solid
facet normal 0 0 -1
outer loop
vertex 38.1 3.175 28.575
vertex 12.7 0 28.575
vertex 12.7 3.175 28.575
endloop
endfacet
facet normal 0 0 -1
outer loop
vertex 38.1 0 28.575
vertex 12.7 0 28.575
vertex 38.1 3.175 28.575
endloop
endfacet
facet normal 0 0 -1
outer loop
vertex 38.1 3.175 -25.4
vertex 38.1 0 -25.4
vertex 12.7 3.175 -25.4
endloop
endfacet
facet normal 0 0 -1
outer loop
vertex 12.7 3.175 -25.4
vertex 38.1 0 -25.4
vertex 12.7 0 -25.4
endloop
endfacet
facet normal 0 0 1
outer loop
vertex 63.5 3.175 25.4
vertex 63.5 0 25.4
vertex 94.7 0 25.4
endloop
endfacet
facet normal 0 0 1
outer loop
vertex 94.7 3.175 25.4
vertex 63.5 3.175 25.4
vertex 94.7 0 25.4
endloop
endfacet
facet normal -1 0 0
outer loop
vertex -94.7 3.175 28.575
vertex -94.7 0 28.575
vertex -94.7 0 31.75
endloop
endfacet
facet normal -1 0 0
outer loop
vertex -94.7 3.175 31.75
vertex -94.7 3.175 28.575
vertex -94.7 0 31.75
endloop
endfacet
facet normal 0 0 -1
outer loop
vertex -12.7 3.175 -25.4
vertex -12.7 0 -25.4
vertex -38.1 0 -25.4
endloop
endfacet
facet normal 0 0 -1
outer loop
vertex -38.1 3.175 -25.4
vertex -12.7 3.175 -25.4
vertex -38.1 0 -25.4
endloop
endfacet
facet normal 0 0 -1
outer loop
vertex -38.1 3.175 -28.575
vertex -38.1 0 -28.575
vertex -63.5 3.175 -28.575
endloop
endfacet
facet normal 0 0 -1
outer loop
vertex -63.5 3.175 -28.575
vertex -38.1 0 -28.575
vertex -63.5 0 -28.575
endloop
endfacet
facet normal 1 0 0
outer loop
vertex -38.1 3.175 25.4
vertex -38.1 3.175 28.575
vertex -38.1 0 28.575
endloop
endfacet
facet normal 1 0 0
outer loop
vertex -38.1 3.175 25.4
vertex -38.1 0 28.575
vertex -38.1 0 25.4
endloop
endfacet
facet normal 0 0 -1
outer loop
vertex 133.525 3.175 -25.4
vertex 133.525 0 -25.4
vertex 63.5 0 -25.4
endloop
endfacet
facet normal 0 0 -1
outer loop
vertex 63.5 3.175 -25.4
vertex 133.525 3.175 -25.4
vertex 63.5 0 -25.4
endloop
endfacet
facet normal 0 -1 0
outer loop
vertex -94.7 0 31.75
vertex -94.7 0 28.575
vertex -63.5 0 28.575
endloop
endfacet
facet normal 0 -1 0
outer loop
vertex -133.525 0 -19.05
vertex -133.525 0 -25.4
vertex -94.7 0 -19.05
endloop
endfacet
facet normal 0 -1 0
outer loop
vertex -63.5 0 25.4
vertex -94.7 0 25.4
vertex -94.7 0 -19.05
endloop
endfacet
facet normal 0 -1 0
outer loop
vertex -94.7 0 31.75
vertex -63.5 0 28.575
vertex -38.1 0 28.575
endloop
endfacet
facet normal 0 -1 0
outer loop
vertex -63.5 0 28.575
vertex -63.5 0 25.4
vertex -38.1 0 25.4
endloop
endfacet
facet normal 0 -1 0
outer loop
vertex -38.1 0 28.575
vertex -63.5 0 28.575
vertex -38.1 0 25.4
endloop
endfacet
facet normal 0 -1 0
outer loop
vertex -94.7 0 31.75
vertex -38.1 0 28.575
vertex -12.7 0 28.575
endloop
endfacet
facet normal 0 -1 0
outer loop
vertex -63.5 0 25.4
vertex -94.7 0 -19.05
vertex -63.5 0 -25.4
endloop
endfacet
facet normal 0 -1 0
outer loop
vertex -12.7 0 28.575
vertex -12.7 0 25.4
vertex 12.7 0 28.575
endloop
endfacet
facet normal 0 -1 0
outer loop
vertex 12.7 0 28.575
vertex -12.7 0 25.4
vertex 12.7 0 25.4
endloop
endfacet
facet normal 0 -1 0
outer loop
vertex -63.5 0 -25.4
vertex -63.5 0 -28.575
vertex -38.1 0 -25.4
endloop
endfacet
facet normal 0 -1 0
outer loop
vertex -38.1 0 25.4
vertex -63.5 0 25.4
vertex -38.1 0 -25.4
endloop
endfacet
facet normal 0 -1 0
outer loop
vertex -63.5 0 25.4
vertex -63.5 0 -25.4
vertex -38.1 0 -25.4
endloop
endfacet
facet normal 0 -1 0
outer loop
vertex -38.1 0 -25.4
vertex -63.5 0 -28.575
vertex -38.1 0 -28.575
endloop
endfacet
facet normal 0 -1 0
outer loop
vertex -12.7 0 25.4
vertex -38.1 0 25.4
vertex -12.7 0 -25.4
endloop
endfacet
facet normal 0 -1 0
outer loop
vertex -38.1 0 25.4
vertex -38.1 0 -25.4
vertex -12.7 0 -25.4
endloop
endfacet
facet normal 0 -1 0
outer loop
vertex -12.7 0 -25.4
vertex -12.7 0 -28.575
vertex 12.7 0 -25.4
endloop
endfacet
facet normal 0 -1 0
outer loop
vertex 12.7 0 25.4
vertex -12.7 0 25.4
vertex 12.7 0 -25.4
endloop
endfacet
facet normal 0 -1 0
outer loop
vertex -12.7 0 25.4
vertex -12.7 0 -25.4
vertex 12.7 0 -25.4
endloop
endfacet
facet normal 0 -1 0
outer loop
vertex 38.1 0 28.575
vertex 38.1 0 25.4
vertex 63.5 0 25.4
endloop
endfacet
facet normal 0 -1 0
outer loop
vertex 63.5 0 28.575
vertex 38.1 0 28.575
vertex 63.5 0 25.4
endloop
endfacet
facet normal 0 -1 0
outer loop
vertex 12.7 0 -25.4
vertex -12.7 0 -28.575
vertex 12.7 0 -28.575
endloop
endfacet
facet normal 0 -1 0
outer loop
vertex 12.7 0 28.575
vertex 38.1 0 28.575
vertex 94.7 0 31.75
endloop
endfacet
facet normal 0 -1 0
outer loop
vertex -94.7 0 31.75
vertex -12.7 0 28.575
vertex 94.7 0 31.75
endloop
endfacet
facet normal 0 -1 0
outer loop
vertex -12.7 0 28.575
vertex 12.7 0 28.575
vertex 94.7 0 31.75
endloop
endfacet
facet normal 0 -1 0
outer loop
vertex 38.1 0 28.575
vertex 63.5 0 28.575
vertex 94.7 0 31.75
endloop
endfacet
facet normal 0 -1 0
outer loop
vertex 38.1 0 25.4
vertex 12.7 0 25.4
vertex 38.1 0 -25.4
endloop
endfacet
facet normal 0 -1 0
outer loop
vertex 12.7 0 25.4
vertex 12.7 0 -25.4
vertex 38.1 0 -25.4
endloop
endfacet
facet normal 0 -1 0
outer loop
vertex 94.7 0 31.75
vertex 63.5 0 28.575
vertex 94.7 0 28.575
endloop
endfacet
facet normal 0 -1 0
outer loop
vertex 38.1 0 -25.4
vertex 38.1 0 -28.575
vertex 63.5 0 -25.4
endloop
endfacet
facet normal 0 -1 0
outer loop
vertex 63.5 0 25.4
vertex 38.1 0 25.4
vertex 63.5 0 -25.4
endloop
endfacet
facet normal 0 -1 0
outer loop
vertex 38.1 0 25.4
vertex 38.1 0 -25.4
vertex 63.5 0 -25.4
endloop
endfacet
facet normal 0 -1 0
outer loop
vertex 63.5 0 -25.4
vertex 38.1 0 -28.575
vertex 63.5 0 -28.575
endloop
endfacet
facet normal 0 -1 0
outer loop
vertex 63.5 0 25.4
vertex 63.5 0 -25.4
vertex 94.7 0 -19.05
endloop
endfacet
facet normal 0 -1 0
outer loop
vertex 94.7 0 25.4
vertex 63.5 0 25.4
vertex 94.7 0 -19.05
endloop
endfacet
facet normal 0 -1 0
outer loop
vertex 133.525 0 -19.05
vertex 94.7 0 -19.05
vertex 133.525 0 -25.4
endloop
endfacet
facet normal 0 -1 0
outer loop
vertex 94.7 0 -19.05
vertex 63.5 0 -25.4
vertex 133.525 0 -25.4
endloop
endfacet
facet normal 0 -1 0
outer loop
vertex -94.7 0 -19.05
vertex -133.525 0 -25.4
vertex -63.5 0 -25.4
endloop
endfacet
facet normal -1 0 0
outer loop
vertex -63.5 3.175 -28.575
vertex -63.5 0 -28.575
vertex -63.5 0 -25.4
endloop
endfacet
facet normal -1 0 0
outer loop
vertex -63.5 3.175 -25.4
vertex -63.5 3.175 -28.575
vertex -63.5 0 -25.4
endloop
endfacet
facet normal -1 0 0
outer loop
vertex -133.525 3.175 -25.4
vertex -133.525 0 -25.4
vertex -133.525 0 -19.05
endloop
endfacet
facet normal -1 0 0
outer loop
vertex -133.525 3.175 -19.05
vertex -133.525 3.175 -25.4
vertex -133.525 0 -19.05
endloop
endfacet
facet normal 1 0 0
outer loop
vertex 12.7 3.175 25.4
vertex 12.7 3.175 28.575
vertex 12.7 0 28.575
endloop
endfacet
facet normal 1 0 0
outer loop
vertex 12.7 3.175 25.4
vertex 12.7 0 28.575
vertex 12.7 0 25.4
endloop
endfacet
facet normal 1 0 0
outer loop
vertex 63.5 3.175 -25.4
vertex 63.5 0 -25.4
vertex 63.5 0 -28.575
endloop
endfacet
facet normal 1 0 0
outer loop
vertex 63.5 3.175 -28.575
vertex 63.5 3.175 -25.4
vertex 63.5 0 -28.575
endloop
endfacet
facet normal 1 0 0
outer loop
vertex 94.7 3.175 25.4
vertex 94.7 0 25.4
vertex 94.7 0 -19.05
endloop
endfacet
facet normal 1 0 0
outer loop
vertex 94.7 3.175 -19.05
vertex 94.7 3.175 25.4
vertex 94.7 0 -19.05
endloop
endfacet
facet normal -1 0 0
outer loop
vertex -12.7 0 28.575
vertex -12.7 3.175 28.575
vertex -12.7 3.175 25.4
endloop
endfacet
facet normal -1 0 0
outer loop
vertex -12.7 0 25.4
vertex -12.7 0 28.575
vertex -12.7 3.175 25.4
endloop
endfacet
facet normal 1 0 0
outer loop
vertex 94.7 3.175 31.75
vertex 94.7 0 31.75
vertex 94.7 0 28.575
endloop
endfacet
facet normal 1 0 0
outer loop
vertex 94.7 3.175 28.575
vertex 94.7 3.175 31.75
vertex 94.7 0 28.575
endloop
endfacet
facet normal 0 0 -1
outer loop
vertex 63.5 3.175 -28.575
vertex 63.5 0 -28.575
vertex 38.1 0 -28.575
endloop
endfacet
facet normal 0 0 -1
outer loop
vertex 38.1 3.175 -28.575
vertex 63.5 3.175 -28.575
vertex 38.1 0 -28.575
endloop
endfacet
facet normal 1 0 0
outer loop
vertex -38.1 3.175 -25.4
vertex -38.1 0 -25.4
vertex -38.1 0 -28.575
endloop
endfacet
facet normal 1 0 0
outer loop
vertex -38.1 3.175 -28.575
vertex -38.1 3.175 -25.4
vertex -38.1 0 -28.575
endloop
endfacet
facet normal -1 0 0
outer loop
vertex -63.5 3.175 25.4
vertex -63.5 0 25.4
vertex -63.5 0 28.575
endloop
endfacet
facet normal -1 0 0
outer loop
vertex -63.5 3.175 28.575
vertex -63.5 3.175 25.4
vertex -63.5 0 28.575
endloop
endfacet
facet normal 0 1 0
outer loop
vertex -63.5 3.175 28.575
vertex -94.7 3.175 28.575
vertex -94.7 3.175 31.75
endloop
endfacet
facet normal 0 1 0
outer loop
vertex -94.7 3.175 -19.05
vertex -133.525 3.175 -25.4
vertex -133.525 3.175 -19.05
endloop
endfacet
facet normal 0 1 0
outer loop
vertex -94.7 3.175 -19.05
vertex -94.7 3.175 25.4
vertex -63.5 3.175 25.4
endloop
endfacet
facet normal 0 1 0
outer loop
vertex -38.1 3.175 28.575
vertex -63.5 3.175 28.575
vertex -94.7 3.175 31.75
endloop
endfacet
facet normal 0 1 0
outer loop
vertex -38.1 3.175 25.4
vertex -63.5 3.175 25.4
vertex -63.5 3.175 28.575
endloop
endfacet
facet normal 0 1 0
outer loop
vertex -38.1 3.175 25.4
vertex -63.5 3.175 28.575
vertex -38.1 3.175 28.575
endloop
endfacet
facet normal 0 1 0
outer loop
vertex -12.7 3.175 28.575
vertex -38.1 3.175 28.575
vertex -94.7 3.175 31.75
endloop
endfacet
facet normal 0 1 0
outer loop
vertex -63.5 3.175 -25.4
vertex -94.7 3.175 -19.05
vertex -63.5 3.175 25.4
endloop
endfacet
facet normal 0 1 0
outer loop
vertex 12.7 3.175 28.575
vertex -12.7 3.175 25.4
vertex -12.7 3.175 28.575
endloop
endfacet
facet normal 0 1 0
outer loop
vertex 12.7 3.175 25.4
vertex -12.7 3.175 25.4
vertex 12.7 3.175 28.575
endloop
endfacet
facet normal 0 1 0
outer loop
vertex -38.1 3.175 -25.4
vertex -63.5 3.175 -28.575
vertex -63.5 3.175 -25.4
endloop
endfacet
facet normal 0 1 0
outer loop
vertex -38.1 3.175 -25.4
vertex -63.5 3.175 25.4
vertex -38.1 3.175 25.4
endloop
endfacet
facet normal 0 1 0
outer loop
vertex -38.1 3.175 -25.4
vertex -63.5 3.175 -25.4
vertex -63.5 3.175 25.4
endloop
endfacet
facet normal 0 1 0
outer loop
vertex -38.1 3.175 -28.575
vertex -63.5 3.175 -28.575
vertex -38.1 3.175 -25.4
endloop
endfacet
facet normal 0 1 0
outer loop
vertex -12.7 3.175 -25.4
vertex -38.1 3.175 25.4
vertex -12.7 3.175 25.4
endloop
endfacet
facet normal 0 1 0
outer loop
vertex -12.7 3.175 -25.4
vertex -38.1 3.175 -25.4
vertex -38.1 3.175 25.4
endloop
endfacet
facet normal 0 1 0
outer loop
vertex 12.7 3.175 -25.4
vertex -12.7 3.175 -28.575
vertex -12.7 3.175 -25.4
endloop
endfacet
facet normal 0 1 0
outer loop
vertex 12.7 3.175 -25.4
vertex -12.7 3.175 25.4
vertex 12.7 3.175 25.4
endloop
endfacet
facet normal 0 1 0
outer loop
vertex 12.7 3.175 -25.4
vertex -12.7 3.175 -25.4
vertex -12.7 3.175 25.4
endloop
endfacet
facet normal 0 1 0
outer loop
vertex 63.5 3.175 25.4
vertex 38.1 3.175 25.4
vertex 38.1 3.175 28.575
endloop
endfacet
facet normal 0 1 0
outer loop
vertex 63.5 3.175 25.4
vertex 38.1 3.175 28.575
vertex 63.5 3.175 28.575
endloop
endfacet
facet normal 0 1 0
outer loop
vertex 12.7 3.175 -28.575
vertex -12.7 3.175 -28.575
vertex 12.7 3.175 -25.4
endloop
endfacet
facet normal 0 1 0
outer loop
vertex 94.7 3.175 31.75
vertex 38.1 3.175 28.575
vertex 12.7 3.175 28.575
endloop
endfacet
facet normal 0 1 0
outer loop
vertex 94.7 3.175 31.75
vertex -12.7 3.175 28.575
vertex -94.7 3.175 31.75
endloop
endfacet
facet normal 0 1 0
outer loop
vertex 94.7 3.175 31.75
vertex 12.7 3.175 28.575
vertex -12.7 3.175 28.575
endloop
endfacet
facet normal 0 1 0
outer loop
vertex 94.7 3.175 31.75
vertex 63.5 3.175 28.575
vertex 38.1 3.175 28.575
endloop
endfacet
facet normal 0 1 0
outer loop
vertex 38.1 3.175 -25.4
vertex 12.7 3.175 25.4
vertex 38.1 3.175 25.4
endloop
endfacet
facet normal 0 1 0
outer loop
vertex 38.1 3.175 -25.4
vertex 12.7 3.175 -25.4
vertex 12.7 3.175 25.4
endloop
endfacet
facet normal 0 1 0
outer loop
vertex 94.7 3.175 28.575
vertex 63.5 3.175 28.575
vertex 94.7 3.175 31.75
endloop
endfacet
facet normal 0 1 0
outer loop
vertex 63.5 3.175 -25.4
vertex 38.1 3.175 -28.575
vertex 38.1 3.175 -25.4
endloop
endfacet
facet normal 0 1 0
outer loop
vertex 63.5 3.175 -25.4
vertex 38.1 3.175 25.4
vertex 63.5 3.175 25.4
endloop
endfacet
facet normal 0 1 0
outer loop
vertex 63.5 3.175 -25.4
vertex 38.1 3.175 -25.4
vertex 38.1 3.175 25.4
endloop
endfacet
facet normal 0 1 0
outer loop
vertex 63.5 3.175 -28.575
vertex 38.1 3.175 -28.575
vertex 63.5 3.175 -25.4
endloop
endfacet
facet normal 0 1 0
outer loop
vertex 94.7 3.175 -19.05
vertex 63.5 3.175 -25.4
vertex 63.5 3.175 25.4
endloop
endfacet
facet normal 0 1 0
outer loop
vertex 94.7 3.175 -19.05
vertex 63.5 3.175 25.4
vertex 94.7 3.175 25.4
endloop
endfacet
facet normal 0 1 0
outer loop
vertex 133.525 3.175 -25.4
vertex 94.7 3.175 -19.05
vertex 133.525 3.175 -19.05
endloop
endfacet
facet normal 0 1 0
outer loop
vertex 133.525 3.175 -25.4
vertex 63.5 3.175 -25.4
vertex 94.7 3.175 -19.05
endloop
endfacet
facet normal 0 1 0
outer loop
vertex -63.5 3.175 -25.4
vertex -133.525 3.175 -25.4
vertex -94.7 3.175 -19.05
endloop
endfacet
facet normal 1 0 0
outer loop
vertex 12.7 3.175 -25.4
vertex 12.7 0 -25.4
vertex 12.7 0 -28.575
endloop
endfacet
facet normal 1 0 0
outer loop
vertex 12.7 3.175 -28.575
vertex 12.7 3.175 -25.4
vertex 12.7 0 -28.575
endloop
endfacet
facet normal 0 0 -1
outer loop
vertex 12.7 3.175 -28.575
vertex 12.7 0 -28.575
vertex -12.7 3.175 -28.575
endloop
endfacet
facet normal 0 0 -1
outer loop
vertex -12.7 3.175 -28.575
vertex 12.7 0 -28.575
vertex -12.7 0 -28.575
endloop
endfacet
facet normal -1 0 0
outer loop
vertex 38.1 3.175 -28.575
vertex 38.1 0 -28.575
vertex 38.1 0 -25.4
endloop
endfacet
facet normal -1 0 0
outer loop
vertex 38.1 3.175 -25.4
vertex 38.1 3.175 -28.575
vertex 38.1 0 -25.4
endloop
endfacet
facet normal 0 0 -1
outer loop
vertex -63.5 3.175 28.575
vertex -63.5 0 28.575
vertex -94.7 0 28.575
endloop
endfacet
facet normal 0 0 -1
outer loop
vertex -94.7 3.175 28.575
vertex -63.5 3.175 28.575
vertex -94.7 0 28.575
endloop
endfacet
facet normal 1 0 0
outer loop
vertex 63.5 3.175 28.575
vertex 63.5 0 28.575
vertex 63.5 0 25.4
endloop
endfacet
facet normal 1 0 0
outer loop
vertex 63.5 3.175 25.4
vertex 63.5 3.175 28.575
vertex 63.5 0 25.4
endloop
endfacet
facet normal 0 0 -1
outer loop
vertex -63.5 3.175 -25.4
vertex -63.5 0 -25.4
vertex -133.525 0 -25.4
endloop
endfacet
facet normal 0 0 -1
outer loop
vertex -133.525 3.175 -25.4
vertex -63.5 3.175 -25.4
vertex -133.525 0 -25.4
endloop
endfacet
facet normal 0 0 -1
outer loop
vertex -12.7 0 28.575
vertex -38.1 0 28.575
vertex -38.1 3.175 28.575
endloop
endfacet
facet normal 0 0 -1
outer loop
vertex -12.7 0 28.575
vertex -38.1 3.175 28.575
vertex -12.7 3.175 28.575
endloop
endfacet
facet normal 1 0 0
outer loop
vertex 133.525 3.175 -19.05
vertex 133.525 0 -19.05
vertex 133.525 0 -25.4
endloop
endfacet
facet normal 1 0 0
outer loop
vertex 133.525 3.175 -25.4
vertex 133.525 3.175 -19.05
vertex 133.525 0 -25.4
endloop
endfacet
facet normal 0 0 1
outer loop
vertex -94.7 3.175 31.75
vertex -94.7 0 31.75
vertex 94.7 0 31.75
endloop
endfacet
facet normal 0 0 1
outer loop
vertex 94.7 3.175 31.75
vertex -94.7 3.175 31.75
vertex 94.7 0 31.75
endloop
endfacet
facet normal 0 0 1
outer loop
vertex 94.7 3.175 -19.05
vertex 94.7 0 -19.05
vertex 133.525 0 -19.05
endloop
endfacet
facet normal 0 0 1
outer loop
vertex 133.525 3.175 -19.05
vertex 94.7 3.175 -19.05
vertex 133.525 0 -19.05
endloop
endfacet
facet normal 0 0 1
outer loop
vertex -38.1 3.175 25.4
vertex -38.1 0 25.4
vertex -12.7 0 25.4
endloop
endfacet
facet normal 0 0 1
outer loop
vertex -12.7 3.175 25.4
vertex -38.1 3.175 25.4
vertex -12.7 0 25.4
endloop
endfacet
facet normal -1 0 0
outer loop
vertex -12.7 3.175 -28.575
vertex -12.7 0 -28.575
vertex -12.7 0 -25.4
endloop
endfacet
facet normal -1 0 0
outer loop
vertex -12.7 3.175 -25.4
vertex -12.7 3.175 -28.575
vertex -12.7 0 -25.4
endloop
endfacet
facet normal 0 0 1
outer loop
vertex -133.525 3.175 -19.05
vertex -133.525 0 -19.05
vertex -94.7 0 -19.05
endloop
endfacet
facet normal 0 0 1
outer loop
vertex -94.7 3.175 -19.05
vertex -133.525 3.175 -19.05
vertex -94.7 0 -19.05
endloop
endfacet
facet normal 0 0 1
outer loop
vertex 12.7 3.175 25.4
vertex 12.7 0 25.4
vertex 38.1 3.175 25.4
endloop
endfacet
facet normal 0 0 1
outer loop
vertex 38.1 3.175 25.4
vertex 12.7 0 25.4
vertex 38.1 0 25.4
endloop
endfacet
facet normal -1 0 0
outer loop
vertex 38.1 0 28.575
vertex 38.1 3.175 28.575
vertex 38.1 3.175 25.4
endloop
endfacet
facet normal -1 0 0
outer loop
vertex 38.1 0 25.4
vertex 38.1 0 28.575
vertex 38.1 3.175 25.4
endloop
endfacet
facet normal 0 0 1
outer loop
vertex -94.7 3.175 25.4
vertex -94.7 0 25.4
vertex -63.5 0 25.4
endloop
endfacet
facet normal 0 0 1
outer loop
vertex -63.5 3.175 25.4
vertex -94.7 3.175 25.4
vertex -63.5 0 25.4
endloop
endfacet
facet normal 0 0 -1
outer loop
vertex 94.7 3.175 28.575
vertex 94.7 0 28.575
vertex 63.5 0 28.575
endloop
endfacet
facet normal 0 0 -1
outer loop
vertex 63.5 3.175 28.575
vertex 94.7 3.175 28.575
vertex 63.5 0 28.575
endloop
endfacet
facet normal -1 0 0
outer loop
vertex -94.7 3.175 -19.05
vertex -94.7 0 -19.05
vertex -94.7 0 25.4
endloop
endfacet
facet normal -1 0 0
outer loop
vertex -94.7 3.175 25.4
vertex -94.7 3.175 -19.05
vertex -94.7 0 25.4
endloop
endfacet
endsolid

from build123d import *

# Parameters (mm, degrees)
SKETCH1_W           = 25.4
SKETCH1_H           = 3.175
BOSS_EXTRUDE1_DEPTH = 3.175


with BuildPart() as part:
    # Sketch1 → Boss-Extrude1 (new body)
    with BuildSketch(Plane(origin=(0, 0, 0), x_dir=(1, 0, 0), z_dir=(0, 1, 0))):
        Polygon((-133.525, 25.4), (-133.525, 19.05), (-94.7, 19.05), (-94.7, -25.4), (-63.5, -25.4), (-63.5, -28.575), (-94.7, -28.575), (-94.7, -31.75), (94.7, -31.75), (94.7, -28.575), (63.5, -28.575), (63.5, -25.4), (94.7, -25.4), (94.7, 19.05), (133.525, 19.05), (133.525, 25.4), (63.5, 25.4), (63.5, 28.575), (38.1, 28.575), (38.1, 25.4), (12.7, 25.4), (12.7, 28.575), (-12.7, 28.575), (-12.7, 25.4), (-38.1, 25.4), (-38.1, 28.575), (-63.5, 28.575), (-63.5, 25.4), align=None)
        with Locations((25.4, -26.9875)):
            Rectangle(SKETCH1_W, SKETCH1_H, mode=Mode.SUBTRACT)
        with Locations((-25.4, -26.9875)):
            Rectangle(SKETCH1_W, SKETCH1_H, mode=Mode.SUBTRACT)
    extrude(amount=BOSS_EXTRUDE1_DEPTH)


solid = part.part
